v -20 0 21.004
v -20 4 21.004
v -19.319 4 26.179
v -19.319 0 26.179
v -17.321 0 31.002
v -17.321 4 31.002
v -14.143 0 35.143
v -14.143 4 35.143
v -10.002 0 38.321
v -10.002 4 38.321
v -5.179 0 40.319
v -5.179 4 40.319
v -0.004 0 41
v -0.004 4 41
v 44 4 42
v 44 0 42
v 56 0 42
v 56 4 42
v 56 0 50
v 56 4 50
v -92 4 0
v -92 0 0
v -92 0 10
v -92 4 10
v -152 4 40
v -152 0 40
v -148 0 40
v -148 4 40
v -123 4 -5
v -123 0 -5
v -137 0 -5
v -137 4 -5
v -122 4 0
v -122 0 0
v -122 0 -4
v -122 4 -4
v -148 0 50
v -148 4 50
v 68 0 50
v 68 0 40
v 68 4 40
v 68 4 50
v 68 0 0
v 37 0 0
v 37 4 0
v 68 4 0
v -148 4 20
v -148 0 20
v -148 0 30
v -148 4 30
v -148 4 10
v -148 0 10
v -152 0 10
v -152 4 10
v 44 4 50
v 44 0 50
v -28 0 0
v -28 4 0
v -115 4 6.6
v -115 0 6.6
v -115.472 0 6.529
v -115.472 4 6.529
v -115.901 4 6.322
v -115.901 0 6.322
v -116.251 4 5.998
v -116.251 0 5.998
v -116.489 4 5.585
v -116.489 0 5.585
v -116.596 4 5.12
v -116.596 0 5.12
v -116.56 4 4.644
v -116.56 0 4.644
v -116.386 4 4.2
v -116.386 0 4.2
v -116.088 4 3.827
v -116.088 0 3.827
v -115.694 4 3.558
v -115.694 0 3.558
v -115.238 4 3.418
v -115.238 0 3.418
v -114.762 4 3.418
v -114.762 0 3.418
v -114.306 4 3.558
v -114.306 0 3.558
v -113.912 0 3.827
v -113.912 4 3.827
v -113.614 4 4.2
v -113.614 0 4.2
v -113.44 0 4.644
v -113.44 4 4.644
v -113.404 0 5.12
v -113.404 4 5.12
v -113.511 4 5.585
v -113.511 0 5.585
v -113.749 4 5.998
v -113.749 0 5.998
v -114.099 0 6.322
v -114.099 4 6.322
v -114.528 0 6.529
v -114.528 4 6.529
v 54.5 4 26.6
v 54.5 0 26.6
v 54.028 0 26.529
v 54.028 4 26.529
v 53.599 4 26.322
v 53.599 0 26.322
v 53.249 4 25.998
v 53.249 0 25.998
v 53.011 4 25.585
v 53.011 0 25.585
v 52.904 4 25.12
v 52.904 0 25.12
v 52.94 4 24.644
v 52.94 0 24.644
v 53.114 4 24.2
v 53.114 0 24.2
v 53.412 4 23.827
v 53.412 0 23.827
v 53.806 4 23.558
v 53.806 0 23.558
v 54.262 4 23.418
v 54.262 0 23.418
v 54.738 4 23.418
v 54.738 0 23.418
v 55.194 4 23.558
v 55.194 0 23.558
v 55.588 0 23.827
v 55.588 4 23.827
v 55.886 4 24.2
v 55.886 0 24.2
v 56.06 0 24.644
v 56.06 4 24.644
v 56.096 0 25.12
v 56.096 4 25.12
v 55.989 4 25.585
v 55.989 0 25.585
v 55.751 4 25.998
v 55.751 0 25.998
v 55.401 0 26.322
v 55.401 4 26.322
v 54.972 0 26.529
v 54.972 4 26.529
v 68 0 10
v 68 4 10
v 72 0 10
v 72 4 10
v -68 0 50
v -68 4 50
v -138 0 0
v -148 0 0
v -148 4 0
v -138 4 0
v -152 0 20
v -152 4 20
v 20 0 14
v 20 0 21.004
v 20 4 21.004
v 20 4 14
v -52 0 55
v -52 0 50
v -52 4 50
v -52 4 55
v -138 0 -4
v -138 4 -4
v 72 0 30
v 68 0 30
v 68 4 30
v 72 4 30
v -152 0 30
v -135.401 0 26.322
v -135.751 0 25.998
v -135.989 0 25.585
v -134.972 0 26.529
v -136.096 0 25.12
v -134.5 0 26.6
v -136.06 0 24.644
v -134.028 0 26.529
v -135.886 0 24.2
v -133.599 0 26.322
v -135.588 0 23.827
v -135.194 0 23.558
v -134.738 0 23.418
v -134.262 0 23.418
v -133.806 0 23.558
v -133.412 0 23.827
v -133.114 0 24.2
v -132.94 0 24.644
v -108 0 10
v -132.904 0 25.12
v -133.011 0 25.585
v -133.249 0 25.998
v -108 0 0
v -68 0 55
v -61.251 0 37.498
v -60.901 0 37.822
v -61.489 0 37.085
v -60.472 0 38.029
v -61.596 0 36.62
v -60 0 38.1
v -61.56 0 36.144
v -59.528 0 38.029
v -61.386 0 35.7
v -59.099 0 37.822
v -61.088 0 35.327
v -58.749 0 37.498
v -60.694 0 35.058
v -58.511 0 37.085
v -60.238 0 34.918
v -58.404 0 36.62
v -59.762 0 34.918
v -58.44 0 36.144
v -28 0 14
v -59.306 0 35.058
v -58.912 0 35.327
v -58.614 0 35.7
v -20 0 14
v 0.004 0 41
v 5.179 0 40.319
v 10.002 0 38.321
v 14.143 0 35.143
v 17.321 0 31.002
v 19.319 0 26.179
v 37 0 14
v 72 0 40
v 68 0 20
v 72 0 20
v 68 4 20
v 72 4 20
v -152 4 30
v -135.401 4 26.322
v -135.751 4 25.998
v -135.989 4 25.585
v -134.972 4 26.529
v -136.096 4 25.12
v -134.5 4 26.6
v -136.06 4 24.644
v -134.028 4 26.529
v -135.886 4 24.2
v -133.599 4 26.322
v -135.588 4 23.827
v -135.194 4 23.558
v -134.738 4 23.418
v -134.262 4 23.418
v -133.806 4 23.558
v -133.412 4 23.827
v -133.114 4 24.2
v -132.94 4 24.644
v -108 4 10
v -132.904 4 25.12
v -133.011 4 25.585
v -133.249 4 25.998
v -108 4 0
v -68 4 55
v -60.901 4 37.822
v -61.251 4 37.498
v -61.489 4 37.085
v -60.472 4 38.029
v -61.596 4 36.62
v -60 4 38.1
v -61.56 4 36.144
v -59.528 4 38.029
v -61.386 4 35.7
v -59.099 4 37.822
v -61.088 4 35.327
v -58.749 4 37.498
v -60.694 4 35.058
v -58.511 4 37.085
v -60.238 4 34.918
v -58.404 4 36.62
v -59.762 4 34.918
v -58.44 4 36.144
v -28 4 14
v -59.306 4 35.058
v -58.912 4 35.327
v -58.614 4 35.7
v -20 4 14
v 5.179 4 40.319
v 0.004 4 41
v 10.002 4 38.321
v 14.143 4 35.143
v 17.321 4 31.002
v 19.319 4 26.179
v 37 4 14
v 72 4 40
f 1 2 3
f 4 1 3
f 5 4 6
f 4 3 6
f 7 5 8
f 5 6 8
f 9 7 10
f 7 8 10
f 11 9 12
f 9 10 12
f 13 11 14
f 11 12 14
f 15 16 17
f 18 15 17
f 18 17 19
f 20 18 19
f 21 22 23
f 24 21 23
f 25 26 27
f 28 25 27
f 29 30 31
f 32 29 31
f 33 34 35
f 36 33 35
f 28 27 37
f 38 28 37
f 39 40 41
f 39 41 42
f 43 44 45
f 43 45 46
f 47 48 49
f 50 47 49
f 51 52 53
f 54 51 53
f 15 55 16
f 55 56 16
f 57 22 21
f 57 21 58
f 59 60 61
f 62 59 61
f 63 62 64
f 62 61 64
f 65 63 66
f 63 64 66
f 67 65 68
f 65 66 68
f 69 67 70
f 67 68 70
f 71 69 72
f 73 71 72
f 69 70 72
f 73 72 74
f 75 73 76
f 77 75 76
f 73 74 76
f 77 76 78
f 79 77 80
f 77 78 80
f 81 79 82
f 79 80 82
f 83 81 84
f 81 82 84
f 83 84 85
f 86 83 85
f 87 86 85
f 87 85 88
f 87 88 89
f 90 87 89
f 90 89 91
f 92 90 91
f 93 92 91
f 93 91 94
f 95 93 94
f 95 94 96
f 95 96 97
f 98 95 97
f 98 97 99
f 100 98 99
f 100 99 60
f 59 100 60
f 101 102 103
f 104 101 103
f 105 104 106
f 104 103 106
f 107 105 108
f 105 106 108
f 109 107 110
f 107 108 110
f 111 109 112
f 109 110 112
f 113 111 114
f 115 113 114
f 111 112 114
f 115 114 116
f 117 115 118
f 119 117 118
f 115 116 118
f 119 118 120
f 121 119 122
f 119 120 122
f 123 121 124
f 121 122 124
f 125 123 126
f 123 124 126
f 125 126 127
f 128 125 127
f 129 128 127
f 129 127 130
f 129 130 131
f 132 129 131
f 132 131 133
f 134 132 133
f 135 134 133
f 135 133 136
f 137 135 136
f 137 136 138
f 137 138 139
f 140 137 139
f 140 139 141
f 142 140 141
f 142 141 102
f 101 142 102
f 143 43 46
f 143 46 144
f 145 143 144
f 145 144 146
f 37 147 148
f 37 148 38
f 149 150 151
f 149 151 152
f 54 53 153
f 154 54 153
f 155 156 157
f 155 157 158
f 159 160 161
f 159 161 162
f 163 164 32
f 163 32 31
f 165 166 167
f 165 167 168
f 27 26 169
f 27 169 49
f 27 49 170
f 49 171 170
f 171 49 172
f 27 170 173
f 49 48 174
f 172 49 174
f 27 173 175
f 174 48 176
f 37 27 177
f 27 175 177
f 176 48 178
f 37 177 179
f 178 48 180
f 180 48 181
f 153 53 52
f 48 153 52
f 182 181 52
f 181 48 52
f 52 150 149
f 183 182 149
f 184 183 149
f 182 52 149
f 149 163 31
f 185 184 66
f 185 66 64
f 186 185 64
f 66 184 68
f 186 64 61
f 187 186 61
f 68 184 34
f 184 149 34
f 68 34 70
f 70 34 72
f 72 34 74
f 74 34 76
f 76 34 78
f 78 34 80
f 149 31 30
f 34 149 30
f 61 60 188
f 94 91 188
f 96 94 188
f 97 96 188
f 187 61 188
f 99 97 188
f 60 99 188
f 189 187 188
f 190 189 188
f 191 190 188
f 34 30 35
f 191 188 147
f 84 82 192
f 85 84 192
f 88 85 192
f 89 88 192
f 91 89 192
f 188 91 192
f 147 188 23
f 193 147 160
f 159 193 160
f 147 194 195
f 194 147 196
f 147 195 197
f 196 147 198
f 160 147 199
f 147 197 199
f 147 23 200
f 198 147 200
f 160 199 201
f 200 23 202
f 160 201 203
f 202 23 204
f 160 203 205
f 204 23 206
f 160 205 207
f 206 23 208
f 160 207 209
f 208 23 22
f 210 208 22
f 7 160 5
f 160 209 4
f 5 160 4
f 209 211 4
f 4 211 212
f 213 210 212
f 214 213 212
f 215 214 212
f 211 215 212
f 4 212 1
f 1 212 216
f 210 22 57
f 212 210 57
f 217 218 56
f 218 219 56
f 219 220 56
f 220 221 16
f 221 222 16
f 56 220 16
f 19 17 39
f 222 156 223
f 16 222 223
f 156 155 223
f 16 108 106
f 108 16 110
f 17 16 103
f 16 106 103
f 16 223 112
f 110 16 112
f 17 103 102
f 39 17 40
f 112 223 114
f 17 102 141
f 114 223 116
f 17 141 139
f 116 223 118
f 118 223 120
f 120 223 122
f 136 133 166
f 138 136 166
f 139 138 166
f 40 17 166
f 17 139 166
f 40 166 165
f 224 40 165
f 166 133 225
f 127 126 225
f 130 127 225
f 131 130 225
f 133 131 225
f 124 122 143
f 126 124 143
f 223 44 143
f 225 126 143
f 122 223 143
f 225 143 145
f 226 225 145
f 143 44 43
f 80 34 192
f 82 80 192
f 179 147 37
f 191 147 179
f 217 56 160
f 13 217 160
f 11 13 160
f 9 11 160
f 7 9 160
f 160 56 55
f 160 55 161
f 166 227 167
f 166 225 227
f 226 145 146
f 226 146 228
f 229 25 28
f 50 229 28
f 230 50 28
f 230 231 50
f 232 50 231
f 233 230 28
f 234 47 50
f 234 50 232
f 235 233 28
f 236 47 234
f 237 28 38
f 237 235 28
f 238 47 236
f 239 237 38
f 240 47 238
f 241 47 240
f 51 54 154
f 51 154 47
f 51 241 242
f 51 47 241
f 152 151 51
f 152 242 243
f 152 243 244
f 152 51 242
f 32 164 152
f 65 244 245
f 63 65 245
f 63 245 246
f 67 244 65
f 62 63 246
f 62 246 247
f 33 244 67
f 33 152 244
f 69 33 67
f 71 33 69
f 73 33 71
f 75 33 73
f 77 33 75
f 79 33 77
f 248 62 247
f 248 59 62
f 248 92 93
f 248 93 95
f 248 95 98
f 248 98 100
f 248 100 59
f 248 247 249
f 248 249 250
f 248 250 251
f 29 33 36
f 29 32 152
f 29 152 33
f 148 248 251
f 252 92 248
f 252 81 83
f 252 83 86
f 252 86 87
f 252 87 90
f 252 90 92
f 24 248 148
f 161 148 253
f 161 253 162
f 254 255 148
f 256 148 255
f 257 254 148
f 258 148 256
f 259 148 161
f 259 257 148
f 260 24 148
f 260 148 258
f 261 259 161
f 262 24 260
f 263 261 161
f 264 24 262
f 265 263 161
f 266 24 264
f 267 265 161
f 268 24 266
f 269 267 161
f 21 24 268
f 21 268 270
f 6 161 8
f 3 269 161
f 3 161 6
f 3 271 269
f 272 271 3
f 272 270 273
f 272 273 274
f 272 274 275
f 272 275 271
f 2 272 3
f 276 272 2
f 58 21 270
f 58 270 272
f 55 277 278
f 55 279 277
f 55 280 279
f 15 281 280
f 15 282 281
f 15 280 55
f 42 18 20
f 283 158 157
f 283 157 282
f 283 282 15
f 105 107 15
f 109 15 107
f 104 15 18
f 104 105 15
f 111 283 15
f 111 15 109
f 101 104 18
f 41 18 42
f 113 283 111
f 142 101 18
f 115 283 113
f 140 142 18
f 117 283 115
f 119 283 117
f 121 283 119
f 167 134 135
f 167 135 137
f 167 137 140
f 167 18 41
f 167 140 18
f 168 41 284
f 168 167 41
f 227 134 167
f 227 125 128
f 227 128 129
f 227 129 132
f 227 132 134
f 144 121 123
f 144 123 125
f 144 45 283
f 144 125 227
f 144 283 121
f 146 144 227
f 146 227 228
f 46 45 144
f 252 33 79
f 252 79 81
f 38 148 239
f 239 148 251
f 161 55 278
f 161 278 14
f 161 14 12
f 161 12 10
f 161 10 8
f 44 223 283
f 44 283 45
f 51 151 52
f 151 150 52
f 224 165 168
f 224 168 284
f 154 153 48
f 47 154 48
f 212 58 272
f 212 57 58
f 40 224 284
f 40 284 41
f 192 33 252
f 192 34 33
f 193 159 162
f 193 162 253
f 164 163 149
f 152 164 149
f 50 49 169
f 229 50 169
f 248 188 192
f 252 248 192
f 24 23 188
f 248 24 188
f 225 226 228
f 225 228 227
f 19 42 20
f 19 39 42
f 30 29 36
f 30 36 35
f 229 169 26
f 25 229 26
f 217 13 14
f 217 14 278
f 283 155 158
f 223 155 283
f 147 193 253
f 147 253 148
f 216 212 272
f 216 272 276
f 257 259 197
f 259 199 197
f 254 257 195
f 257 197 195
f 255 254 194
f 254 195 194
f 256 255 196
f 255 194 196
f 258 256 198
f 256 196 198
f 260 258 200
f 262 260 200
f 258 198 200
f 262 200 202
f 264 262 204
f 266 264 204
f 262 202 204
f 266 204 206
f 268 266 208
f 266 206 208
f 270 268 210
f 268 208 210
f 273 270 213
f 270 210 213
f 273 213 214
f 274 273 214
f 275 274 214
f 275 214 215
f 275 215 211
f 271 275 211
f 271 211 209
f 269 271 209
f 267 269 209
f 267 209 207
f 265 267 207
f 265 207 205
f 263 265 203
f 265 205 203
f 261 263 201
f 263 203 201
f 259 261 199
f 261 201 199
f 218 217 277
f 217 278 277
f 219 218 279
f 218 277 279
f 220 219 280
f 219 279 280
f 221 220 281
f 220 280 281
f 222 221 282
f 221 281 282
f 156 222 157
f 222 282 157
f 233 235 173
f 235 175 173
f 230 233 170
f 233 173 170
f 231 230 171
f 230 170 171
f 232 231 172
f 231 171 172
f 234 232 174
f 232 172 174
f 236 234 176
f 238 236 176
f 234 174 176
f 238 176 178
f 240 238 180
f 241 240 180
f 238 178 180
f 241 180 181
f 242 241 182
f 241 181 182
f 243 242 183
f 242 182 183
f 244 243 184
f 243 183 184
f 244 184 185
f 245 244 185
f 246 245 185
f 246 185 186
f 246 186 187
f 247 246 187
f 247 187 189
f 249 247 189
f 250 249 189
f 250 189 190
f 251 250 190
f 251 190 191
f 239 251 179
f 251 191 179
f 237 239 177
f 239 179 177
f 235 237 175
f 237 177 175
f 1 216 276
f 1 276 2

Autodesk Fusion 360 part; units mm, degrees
sketch "スケッチ1" plane through (0, 0, 0) normal (0, 1, 0) x (1, 0, 0)
  line L0 (-20, -14) -> (-20, -41)
  line L1 (-20, -41) -> (20, -41)
  line L2 (20, -41) -> (20, -14)
  line L3 (20, -14) -> (37, -14)
  line L4 (37, -14) -> (37, 0)
  line L5 (37, 0) -> (68, 0)
  line L6 (68, 0) -> (68, -10)
  line L7 (68, -10) -> (72, -10)
  line L8 (72, -10) -> (72, -20)
  line L9 (72, -20) -> (68, -20)
  line L10 (68, -20) -> (68, -30)
  line L11 (68, -30) -> (72, -30)
  line L12 (72, -30) -> (72, -40)
  line L13 (72, -40) -> (68, -40)
  line L14 (68, -40) -> (68, -50)
  line L15 (68, -50) -> (-148, -50)
  line L16 (-148, 0) -> (-28, 0)
  line L17 (-148, 0) -> (-148, -10)
  line L18 (-148, -10) -> (-152, -10)
  line L19 (-152, -10) -> (-152, -20)
  line L20 (-152, -20) -> (-148, -20)
  line L21 (-148, -20) -> (-148, -30)
  line L22 (-148, -30) -> (-152, -30)
  line L23 (-152, -30) -> (-152, -40)
  line L24 (-152, -40) -> (-148, -40)
  line L25 (-148, -40) -> (-148, -50)
  line L26 (-108, 0) -> (-92, 0)
  line L27 (-92, 0) -> (-92, -10)
  line L28 (-92, -10) -> (-108, -10)
  line L29 (-108, -10) -> (-108, 0)
  line L30 (-68, -50) -> (-52, -50)
  line L31 (-52, -50) -> (-52, -55)
  line L32 (-52, -55) -> (-68, -55)
  line L33 (-68, -55) -> (-68, -50)
  line L34 (-138, 0) -> (-122, 0)
  line L35 (-122, 0) -> (-122, 5)
  line L36 (-122, 5) -> (-138, 5)
  line L37 (-138, 5) -> (-138, 0)
  line L38 (56, -50) -> (44, -50)
  line L39 (44, -50) -> (44, -42)
  line L40 (44, -42) -> (56, -42)
  line L41 (56, -42) -> (56, -50)
  line L42 (-28, 0) -> (-28, -14)
  line L43 (-28, -14) -> (-20, -14)
  point P0 (-100, 0)
  point P1 (-130, 0)
  point P2 (-60, -50)
  dimension "d9" = 20
  dimension "d10" = 14
  dimension "d11" = 68
  dimension "d12" = 4
  dimension "d13" = 10
  dimension "d14" = 10
  dimension "d15" = 10
  dimension "d16" = 10
  dimension "d17" = 10
  dimension "d19" = 17
  dimension "d34" = 4
  dimension "d37" = 216
  dimension "d40" = 100
  dimension "d41" = 10
  dimension "d42" = 16
  dimension "d43" = 5
  dimension "d44" = 16
  dimension "d45" = 60
  dimension "d46" = 130
  dimension "d50" = 12
  dimension "d51" = 12
  dimension "d52" = 8
  dimension "d53" = 41
  dimension "d54" = 20
  dimension "d55" = 8
extrude "押し出し1" add sketch "スケッチ1" along normal blind 4 contours L0 L1 L2 L3 L4 L5 L6 L7 L8 L9 L10 L11 L12 L13 L14 L15 L16 L17 L18 L19 L20 L21 L22 L23 L24 L25 L27 L28 L29 L30 L34 L39 L40 L41 L42 L43 | L16 L34 L35 L36 L37 | L15 L30 L31 L32 L33
sketch "スケッチ2" plane through (0, 4, 0) normal (0, 1, 0) x (-1, 0, 0)
  line L0 (-56, 50) -> (-68, 50)
  line L1 (-68, 50) -> (-68, 40)
  line L2 (-68, 40) -> (-72, 40)
  line L3 (-72, 40) -> (-72, 30)
  line L4 (-72, 30) -> (-68, 30)
  line L5 (-68, 30) -> (-68, 20)
  line L6 (-68, 20) -> (-72, 20)
  line L7 (-72, 20) -> (-72, 10)
  line L8 (-72, 10) -> (-68, 10)
  line L9 (-68, 10) -> (-68, 0)
  line L10 (-68, 0) -> (-37, 0)
  line L11 (-37, 0) -> (-37, 14)
  line L12 (-37, 14) -> (-20, 14)
  line L13 (-20, 14) -> (-20, 41)
  line L14 (-20, 41) -> (20, 41)
  line L15 (20, 41) -> (20, 14)
  line L16 (138, 0) -> (148, 0)
  line L17 (-54.5, 25) -> (-68, 25)
  line L18 (60, 36.5) -> (115, 5)
  line L19 (148, 0) -> (148, 10)
  line L20 (148, 10) -> (152, 10)
  line L21 (152, 10) -> (152, 20)
  line L22 (152, 20) -> (148, 20)
  line L23 (148, 20) -> (148, 30)
  line L24 (148, 30) -> (152, 30)
  line L25 (152, 30) -> (152, 40)
  line L26 (152, 40) -> (148, 40)
  line L27 (148, 40) -> (148, 50)
  line L28 (148, 25) -> (134.5, 25)
  line L29 (92, 0) -> (92, 10)
  line L30 (92, 10) -> (108, 10)
  line L31 (108, 10) -> (108, 0)
  line L32 (122, 0) -> (122, -5)
  line L33 (122, -5) -> (138, -5)
  line L34 (138, -5) -> (138, 0)
  line L35 (68, 50) -> (68, 55)
  line L36 (68, 55) -> (52, 55)
  line L37 (52, 55) -> (52, 50)
  line L38 (52, 50) -> (-44, 50)
  line L39 (108, 0) -> (122, 0)
  line L40 (-44, 50) -> (-44, 42)
  line L41 (-44, 42) -> (-56, 42)
  line L42 (-56, 42) -> (-56, 50)
  line L43 (148, 50) -> (68, 50)
  line L44 (20, 14) -> (28, 14)
  line L45 (28, 14) -> (28, 0)
  line L46 (28, 0) -> (92, 0)
  dimension "d24" = 13.5
  dimension "d25" = 5
  dimension "d27" = 13.5
  dimension "d38" = 60
  dimension "d39" = 115
hole "穴1" at (-115, 4, 5) at (-60, 4, 36.5) at (54.5, 4, 25) at (-134.5, 4, 25) direction (0, -1, 0) diameter 3.2 end through all
fillet "フィレット1" radius 20 2 edges at (20, 2, 41) (-20, 2, 41)
chamfer "面取り1" distance 1 angle 45 2 edges at (-138, 2, -5) (-122, 2, -5)
